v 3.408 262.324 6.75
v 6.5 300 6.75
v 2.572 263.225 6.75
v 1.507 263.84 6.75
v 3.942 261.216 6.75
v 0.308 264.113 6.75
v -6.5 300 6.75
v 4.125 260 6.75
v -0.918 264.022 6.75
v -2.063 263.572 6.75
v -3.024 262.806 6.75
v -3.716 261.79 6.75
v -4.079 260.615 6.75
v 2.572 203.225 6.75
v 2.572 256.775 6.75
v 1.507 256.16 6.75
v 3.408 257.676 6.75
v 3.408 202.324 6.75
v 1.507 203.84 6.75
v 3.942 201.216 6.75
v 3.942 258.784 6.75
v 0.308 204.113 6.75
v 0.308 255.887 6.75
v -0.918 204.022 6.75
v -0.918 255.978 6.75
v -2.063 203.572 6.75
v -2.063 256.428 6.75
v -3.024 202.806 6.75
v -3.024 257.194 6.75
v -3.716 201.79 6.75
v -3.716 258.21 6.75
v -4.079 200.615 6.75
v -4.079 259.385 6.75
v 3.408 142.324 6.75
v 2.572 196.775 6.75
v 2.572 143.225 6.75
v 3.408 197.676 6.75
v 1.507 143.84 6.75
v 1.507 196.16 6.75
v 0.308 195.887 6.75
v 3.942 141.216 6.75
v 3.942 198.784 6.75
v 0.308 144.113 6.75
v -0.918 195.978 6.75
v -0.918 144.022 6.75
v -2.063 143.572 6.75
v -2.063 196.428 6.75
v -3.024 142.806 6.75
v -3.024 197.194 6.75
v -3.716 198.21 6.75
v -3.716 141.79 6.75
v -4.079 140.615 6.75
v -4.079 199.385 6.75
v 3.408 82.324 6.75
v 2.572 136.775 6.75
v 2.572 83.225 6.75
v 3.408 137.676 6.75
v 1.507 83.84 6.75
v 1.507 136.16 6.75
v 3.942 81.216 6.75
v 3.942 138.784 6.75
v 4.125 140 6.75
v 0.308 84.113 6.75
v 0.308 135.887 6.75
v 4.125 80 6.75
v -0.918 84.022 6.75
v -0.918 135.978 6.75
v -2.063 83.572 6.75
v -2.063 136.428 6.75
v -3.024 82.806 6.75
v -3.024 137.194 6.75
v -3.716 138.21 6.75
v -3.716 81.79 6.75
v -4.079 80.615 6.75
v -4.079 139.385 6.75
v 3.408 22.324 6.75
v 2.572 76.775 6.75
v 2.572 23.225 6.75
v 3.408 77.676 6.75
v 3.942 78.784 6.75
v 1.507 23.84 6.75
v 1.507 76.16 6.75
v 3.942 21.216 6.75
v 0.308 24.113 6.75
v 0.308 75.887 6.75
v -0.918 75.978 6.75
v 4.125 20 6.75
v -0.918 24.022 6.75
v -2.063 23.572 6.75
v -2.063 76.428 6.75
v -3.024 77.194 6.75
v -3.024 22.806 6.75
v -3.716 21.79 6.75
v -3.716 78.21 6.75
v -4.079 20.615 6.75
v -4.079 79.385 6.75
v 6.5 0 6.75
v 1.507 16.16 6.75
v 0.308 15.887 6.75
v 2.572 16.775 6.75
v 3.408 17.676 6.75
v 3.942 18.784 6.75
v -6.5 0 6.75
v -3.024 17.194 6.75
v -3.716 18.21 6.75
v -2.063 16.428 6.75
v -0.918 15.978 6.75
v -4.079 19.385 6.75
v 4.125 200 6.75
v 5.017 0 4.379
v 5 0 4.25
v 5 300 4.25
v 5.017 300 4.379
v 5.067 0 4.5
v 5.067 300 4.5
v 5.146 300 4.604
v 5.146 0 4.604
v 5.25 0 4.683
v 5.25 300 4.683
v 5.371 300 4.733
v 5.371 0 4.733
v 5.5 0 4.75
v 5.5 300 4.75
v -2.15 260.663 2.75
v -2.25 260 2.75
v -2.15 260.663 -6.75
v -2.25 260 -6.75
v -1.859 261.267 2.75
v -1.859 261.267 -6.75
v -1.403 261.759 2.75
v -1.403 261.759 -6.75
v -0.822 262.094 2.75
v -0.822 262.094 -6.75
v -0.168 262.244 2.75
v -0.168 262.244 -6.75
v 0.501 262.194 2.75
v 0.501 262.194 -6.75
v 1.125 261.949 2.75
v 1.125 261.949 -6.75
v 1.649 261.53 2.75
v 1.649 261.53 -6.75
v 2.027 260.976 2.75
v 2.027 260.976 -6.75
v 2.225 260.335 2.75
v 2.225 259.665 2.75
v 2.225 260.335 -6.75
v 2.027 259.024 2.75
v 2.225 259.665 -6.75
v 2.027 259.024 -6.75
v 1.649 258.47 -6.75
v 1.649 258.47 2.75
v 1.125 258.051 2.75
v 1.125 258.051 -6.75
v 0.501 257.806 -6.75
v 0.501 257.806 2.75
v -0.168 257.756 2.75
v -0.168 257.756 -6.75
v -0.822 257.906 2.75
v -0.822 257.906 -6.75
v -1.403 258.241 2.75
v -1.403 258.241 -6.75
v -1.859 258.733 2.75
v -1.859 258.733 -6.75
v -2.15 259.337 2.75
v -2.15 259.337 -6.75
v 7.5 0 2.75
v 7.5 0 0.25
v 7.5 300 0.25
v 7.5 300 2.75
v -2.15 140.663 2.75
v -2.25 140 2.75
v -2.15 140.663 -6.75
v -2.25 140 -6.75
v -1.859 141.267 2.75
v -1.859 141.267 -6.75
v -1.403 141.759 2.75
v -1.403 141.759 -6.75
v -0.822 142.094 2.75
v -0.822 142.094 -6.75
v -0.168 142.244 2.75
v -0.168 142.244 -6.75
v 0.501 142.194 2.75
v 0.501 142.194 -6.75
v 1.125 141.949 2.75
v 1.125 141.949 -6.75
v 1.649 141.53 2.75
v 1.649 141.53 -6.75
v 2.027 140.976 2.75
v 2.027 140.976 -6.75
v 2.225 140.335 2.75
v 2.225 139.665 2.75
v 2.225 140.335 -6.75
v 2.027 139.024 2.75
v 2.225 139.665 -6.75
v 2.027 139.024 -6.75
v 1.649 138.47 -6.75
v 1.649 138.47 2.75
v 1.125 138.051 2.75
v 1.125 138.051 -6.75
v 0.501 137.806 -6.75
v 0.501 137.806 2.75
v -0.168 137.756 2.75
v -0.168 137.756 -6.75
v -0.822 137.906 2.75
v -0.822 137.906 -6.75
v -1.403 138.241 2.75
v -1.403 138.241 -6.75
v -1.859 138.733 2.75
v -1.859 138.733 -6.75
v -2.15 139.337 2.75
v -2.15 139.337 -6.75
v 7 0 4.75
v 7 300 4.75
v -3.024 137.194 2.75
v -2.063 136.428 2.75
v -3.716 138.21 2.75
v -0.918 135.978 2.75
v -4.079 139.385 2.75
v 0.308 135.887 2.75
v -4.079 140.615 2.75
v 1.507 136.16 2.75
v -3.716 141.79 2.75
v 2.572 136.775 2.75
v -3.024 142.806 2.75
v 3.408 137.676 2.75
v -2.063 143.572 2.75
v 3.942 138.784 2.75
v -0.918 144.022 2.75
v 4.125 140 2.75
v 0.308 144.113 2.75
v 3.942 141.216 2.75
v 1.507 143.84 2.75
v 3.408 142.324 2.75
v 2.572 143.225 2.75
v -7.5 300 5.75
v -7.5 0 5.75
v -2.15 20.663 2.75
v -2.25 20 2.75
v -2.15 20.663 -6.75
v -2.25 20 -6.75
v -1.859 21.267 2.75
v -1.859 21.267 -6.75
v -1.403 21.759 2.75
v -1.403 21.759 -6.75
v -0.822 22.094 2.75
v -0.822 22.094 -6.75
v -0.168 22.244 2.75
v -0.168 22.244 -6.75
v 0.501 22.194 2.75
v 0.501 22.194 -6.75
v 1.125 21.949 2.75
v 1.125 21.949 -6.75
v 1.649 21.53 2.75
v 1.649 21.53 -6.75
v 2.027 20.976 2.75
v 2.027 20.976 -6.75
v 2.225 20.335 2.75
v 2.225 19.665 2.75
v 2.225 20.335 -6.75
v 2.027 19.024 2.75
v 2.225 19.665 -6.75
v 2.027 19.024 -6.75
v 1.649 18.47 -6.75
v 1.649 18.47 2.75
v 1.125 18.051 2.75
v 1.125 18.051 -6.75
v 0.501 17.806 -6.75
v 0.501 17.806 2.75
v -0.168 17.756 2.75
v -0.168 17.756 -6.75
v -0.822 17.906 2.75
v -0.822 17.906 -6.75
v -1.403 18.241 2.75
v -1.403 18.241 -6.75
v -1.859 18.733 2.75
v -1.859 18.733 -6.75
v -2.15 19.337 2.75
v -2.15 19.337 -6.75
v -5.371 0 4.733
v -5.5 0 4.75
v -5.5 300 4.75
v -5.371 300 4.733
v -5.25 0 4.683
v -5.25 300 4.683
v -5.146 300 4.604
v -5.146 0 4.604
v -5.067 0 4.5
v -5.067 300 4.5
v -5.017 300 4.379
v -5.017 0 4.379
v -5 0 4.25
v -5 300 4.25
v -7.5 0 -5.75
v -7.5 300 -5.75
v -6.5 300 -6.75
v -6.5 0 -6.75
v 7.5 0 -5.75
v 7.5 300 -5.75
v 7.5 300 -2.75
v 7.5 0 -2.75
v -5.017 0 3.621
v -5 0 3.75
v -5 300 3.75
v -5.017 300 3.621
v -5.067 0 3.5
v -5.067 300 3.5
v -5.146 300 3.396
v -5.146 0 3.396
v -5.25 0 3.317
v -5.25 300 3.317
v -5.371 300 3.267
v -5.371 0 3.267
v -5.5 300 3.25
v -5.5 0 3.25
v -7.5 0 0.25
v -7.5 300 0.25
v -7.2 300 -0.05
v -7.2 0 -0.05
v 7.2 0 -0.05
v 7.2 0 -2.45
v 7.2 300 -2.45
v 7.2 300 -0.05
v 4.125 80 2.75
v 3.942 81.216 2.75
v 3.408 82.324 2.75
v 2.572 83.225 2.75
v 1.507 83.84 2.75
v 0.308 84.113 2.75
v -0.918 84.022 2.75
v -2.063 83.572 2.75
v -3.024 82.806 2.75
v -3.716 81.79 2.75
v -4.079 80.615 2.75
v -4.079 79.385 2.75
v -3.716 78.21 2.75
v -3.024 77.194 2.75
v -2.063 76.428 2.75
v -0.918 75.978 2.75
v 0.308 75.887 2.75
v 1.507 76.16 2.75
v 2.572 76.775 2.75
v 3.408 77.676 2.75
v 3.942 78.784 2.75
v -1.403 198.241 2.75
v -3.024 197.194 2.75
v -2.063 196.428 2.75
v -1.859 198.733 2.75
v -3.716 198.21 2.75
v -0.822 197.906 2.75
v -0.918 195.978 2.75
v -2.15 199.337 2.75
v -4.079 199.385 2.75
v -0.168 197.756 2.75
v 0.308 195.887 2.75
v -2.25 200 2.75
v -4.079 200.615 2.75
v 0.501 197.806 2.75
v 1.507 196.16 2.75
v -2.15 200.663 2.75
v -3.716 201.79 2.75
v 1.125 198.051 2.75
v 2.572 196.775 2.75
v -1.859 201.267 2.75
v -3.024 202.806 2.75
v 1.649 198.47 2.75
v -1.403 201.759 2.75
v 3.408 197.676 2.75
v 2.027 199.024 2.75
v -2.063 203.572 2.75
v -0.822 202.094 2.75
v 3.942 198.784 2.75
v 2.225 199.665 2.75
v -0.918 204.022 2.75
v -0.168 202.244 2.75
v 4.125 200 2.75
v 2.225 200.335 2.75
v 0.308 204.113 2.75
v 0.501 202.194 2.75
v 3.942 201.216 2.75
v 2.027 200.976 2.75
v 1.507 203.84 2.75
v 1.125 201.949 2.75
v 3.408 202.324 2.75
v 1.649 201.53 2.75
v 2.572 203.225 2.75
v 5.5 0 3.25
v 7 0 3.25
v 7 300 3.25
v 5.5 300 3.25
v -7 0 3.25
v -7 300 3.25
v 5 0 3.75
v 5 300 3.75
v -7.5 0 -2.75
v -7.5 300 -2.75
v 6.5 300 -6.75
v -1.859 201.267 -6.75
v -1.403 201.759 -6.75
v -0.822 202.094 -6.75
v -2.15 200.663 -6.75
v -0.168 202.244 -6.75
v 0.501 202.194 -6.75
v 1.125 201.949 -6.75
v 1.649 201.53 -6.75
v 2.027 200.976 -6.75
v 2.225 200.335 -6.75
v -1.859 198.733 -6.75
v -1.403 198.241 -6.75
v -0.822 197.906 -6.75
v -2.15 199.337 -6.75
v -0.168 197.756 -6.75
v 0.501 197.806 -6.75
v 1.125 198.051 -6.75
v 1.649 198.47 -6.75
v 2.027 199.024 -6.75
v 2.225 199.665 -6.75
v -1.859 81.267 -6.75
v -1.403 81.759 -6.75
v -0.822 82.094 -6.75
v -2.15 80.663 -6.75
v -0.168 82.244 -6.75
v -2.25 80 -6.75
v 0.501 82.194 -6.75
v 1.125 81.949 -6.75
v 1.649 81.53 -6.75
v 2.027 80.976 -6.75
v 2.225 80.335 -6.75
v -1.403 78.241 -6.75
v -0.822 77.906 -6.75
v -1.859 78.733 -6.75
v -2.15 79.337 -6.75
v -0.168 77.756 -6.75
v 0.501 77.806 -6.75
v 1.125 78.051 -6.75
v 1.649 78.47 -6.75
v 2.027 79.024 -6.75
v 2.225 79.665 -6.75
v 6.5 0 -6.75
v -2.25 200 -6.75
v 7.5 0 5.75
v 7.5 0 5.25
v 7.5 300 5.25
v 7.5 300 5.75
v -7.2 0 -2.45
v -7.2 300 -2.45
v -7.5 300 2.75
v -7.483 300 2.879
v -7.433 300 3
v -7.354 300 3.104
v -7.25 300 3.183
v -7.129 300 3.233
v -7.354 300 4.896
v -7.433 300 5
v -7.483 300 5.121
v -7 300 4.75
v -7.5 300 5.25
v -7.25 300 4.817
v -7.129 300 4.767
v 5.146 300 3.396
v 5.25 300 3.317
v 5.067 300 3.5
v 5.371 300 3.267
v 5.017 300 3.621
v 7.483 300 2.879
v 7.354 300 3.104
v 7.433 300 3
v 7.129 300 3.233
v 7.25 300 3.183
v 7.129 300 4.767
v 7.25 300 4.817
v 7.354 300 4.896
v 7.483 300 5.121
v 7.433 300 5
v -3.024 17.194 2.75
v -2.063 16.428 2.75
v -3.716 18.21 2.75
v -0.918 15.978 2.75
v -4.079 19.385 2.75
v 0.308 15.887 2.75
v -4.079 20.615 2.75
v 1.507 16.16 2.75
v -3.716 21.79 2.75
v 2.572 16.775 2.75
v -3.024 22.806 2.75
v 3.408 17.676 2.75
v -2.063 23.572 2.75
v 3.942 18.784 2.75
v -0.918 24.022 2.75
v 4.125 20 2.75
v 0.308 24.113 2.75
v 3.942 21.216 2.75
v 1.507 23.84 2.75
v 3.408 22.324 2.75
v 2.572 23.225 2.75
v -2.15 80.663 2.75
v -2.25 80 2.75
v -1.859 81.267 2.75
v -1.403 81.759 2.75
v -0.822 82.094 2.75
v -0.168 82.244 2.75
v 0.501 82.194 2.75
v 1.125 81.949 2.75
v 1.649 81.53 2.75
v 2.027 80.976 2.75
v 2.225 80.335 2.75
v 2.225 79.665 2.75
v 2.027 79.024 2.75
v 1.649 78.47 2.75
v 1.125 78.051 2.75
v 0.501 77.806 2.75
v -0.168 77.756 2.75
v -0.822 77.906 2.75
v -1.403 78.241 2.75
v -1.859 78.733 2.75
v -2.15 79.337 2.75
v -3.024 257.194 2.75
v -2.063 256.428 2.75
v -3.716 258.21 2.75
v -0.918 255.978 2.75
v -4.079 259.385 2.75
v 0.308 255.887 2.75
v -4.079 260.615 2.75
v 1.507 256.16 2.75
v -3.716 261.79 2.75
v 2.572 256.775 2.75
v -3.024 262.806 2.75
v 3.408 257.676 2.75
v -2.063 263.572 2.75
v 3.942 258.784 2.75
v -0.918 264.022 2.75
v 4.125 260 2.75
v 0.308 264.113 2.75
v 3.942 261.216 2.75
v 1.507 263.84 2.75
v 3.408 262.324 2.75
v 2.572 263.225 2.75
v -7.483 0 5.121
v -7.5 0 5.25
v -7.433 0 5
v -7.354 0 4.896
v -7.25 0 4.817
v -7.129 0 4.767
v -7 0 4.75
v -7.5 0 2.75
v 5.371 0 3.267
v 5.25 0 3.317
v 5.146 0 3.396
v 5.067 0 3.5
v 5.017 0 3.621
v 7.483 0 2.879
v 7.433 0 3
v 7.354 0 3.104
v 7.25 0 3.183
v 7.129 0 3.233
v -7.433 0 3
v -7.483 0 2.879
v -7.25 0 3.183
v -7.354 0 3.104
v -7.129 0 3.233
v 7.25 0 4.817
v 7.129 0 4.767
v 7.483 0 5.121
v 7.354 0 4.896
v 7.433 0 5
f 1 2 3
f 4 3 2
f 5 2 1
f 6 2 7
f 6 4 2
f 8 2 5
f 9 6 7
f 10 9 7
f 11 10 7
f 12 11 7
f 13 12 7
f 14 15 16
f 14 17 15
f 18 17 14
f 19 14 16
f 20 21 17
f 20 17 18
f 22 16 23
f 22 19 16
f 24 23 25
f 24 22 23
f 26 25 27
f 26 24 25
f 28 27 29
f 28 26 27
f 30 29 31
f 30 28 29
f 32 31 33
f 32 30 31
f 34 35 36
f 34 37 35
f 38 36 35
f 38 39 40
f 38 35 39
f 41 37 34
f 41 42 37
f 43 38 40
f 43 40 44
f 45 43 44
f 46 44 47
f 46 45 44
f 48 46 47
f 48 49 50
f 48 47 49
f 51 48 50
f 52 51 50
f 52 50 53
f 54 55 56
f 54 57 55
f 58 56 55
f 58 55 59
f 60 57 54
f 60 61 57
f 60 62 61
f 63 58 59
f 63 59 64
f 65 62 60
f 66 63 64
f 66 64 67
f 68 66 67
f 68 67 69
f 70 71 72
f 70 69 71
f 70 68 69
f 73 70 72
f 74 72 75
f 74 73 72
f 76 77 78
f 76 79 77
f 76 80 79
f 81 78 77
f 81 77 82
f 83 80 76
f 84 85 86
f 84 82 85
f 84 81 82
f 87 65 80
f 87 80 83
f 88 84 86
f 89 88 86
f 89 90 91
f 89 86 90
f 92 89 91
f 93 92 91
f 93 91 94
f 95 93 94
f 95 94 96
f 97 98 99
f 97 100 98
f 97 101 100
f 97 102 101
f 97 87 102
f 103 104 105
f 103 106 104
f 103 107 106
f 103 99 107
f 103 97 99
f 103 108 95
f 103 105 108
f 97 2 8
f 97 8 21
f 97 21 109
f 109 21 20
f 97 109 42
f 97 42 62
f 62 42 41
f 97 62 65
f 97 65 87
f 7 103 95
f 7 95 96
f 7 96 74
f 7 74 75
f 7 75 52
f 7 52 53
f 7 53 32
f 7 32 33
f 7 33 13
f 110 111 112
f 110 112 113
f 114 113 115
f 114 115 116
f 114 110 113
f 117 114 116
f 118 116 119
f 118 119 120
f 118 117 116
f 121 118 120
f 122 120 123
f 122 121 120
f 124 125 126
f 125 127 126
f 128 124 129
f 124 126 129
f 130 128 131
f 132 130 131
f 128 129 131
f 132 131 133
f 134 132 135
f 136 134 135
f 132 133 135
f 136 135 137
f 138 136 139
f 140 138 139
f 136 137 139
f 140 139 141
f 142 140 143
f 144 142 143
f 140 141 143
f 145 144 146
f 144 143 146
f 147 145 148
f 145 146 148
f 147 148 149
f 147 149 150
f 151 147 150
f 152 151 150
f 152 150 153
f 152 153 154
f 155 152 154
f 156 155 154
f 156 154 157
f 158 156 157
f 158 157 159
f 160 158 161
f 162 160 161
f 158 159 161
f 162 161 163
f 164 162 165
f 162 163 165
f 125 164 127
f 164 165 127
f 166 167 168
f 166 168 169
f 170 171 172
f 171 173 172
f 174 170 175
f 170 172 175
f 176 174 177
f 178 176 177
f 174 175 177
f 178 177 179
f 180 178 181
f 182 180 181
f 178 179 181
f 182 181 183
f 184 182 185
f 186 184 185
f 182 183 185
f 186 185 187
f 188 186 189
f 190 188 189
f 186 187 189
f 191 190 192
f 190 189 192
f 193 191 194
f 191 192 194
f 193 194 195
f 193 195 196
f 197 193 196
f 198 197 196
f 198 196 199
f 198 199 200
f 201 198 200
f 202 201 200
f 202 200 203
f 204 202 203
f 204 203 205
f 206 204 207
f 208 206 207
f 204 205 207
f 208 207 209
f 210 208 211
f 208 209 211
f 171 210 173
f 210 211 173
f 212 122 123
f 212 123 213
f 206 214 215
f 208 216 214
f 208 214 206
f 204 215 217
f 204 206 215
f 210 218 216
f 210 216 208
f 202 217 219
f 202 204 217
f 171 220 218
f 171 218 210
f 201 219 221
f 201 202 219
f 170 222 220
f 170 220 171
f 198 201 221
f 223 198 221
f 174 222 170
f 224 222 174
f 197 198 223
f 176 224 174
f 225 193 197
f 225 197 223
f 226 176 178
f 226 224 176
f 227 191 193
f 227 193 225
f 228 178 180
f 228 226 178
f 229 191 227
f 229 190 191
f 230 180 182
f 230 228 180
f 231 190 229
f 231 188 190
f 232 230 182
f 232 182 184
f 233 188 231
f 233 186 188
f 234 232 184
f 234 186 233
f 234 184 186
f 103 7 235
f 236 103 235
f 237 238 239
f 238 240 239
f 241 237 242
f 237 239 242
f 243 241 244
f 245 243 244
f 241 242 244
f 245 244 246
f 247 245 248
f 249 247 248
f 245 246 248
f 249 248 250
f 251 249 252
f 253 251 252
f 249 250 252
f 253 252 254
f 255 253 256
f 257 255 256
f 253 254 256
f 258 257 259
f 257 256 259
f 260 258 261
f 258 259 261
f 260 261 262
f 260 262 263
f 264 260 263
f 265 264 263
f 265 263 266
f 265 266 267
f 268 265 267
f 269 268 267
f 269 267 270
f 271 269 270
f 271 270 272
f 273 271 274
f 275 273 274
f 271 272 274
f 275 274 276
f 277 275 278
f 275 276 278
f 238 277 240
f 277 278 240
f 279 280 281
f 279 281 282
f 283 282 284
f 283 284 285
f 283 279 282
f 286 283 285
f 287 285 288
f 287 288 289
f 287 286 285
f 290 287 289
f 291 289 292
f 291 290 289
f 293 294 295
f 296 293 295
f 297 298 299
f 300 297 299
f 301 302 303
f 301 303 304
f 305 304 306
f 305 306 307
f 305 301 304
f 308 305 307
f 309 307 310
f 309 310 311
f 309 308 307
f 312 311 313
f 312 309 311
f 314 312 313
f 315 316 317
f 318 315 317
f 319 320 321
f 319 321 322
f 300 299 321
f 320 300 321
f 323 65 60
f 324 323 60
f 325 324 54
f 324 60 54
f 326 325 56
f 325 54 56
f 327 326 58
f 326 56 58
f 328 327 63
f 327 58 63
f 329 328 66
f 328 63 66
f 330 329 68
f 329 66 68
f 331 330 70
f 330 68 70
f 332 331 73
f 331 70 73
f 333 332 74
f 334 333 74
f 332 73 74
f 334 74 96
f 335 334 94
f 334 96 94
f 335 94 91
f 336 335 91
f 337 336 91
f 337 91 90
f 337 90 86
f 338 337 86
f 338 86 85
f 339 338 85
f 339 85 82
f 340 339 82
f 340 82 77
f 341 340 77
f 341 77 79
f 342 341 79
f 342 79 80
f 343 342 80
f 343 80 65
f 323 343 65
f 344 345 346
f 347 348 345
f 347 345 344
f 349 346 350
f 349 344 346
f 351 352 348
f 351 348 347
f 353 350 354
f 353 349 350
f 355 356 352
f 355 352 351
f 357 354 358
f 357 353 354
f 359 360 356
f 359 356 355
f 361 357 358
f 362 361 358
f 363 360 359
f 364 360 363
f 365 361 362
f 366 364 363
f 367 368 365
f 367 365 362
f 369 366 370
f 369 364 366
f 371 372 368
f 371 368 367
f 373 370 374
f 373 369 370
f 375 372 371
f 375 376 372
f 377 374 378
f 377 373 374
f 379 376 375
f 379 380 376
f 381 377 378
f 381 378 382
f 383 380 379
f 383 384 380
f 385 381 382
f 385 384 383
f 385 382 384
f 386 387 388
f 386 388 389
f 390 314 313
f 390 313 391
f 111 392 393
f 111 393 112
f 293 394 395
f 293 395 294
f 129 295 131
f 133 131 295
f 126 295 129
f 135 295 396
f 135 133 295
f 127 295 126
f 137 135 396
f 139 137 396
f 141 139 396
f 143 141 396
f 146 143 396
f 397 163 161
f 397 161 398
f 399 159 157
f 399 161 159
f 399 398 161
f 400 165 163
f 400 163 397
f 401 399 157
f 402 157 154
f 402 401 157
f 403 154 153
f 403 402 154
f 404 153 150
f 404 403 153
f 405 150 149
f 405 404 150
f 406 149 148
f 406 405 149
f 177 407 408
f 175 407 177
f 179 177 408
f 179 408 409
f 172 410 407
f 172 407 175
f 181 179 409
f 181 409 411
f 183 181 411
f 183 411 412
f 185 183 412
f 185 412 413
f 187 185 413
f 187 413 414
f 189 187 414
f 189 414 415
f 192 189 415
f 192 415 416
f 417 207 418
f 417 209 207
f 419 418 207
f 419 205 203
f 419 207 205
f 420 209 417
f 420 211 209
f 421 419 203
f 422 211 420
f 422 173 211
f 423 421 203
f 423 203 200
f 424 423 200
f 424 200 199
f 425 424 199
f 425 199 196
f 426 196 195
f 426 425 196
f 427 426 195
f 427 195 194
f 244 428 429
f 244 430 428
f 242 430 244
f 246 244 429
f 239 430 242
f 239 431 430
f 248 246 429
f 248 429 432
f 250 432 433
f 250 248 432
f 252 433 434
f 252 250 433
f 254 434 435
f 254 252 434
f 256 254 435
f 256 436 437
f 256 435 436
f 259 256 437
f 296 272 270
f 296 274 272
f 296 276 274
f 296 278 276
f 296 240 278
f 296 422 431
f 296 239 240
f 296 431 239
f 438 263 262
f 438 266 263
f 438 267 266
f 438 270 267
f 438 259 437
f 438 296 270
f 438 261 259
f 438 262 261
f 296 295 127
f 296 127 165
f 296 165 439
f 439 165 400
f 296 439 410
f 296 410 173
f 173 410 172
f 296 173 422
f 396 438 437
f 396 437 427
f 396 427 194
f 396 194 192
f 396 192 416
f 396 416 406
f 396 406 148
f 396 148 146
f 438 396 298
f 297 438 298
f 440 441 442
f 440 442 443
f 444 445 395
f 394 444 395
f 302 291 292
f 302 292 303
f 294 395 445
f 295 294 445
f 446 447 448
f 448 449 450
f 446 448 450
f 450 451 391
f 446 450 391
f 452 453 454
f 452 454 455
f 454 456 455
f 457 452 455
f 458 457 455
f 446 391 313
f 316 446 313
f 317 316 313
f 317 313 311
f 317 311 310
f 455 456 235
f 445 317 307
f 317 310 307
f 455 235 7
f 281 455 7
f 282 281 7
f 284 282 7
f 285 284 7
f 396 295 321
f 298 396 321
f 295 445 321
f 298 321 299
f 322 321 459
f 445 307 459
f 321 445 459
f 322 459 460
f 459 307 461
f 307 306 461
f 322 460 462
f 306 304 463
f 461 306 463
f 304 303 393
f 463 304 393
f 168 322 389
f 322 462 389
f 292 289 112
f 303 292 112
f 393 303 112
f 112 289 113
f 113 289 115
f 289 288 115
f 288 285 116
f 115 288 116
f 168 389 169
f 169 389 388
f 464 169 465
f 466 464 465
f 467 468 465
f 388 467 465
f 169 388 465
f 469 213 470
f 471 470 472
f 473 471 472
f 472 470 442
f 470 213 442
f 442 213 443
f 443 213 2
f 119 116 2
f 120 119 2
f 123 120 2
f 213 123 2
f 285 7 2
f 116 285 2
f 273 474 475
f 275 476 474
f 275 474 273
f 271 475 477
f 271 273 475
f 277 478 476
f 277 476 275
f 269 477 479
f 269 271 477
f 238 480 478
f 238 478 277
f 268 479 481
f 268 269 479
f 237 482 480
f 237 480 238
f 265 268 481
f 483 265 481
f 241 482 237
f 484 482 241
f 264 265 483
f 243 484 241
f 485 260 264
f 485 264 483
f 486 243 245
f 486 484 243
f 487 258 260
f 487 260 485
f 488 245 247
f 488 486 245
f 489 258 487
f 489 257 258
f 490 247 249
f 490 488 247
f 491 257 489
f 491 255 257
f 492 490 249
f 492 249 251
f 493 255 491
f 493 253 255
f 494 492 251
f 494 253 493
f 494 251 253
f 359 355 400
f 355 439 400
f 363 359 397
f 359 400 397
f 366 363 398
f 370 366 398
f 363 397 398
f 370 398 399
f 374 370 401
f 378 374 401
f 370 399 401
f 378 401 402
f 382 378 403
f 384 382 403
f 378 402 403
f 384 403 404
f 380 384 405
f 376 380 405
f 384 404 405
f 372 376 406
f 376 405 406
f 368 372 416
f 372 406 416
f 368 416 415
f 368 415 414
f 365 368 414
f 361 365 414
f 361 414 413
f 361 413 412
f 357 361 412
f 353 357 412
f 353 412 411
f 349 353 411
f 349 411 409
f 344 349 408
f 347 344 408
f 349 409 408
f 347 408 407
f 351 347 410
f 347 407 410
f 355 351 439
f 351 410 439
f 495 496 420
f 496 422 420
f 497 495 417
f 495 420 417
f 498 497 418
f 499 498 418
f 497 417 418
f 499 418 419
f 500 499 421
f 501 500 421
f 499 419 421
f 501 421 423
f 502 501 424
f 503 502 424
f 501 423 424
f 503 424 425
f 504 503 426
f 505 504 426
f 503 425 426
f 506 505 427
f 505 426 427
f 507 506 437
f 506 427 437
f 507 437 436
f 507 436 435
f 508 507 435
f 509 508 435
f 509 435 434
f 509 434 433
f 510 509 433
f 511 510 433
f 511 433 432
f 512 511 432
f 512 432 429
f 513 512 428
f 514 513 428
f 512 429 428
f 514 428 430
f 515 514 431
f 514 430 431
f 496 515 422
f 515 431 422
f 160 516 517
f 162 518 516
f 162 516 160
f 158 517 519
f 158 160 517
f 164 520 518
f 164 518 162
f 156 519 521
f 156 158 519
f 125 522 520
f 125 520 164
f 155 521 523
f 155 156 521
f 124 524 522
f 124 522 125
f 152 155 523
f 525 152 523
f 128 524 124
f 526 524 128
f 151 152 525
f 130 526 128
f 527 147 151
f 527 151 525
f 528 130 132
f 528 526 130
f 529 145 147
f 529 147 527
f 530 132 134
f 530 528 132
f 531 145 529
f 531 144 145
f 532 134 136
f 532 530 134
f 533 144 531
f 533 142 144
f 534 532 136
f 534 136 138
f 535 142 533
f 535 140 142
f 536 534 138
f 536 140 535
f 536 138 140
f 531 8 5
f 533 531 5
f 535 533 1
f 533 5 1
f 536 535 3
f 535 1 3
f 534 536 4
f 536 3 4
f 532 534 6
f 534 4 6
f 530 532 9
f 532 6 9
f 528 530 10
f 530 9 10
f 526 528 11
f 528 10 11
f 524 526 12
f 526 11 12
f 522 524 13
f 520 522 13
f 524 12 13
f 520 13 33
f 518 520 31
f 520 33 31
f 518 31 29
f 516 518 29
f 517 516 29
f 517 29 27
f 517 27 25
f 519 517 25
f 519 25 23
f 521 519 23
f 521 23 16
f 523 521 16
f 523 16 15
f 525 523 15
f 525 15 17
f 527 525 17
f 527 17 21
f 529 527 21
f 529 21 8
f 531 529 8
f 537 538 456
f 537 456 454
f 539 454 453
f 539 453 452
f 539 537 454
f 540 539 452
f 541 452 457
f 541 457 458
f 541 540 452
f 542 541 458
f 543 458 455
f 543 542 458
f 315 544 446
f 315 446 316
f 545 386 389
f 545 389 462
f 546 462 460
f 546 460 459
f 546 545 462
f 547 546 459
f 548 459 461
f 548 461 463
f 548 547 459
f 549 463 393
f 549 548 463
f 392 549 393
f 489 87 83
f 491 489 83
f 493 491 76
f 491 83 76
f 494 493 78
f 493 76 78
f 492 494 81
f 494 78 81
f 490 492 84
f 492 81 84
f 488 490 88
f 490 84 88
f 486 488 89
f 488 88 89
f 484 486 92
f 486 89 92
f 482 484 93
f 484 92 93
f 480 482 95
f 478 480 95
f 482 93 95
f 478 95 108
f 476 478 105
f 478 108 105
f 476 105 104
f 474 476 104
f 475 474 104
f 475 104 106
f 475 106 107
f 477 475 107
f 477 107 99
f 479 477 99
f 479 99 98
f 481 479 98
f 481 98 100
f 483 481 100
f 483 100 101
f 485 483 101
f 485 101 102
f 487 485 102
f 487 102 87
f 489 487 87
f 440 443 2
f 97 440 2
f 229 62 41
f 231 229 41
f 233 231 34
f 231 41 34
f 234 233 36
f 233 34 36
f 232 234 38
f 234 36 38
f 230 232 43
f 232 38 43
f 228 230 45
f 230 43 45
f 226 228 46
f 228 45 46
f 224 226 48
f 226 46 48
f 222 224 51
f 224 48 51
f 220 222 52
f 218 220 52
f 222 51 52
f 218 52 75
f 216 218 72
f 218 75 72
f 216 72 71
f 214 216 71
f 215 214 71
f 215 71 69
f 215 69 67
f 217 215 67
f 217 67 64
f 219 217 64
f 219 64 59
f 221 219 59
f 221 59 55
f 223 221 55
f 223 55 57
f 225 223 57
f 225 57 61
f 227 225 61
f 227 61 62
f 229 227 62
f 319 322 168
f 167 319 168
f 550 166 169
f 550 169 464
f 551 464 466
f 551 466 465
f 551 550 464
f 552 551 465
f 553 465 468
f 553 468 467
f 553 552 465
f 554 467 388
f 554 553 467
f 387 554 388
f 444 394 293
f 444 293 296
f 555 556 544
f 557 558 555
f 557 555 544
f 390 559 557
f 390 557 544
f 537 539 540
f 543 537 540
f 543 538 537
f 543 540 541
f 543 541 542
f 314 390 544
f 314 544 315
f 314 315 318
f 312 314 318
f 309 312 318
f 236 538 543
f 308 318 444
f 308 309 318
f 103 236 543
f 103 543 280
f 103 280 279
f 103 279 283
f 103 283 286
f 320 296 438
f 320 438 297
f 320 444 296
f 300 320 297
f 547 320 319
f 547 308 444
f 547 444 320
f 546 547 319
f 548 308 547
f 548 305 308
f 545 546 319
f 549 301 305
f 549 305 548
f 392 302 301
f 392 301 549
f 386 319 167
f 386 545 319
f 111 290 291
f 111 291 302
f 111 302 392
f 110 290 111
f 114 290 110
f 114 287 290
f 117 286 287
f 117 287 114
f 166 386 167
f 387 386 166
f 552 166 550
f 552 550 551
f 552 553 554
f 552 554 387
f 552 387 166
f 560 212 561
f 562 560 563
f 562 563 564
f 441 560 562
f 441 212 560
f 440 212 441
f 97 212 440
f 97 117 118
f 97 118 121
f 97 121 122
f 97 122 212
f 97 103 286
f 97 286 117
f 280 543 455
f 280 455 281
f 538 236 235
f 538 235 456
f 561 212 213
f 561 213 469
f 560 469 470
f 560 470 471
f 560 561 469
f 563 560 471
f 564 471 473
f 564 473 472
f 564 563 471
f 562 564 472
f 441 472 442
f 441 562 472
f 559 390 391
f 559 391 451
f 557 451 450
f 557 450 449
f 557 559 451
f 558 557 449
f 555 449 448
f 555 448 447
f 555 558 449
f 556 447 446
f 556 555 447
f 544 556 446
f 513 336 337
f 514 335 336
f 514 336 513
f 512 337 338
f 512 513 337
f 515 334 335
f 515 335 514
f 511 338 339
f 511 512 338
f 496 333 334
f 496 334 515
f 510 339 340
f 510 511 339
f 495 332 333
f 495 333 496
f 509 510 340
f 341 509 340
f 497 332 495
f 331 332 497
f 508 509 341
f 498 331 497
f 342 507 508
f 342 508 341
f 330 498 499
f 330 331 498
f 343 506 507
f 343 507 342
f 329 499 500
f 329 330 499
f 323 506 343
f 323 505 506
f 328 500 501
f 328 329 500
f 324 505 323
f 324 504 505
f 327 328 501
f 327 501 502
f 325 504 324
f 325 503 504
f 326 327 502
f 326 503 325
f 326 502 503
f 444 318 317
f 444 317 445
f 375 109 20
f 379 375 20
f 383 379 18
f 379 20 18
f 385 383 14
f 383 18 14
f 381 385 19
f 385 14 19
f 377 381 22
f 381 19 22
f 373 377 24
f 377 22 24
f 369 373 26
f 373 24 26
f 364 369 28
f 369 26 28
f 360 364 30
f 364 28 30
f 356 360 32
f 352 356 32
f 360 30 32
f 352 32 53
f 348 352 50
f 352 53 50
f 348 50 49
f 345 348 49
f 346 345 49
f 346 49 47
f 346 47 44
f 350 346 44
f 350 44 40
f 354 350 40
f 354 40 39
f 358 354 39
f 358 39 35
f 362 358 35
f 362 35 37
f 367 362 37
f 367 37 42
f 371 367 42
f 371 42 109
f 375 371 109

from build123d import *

# Parameters (mm, degrees)
F1_DEPTH       = 300
F3_D           = 4.5
F3_CBORE_D     = 8.25
F3_CBORE_DEPTH = 4


with BuildPart() as f1:
    # F0 (on Front) → F1 (new body)
    with BuildSketch(Plane.XZ):
        with BuildLine():
            Line((-6.5, -6.75), (6.5, -6.75))
            Line((6.5, -6.75), (7.5, -5.75))
            Line((7.5, -5.75), (7.5, -2.75))
            Line((7.5, -2.75), (7.2, -2.75))
            Line((7.2, -2.75), (7.2, -2.45))
            Line((7.2, -2.45), (7.2, -0.05))
            Line((7.2, -0.05), (7.2, 0.25))
            Line((7.2, 0.25), (7.5, 0.25))
            Line((7.5, 0.25), (7.5, 2.75))
            ThreePointArc((7.5, 2.75), (7.3535533906, 3.1035533906), (7, 3.25))
            Line((7, 3.25), (5.5, 3.25))
            ThreePointArc((5.5, 3.25), (5.1464466094, 3.3964466094), (5, 3.75))
            Line((5, 3.75), (5, 4.25))
            ThreePointArc((5, 4.25), (5.1464466094, 4.6035533906), (5.5, 4.75))
            Line((5.5, 4.75), (7, 4.75))
            ThreePointArc((7, 4.75), (7.3535533906, 4.8964466094), (7.5, 5.25))
            Line((7.5, 5.25), (7.5, 5.75))
            Line((7.5, 5.75), (6.5, 6.75))
            Line((6.5, 6.75), (-6.5, 6.75))
            Line((-6.5, 6.75), (-7.5, 5.75))
            Line((-7.5, 5.75), (-7.5, 5.25))
            ThreePointArc((-7.5, 5.25), (-7.3535533906, 4.8964466094), (-7, 4.75))
            Line((-7, 4.75), (-5.5, 4.75))
            ThreePointArc((-5.5, 4.75), (-5.1464466094, 4.6035533906), (-5, 4.25))
            Line((-5, 4.25), (-5, 3.75))
            ThreePointArc((-5, 3.75), (-5.1464466094, 3.3964466094), (-5.5, 3.25))
            Line((-5.5, 3.25), (-7, 3.25))
            ThreePointArc((-7, 3.25), (-7.3535533906, 3.1035533906), (-7.5, 2.75))
            Line((-7.5, 2.75), (-7.5, 0.25))
            Line((-7.5, 0.25), (-7.2, 0.25))
            Line((-7.2, 0.25), (-7.2, -0.05))
            Line((-7.2, -0.05), (-7.2, -2.45))
            Line((-7.2, -2.45), (-7.2, -2.75))
            Line((-7.2, -2.75), (-7.5, -2.75))
            Line((-7.5, -2.75), (-7.5, -5.75))
            Line((-7.5, -5.75), (-6.5, -6.75))
        make_face()
        Polygon((-7.2, 0.25), (-7.5, 0.25), (-7.2, -0.05), align=None)
        Polygon((-7.2, -2.45), (-7.5, -2.75), (-7.2, -2.75), align=None)
        Polygon((7.2, -2.75), (7.5, -2.75), (7.2, -2.45), align=None)
        Polygon((7.2, -0.05), (7.5, 0.25), (7.2, 0.25), align=None)
    extrude(amount=-F1_DEPTH)

    # F3 (through all)
    with Locations(Plane.XY.offset(6.75)):
        with Locations((0, 20), (0, 80), (0, 140), (0, 200), (0, 260)):
            CounterBoreHole(F3_D / 2, F3_CBORE_D / 2, F3_CBORE_DEPTH)


solid = f1.part
